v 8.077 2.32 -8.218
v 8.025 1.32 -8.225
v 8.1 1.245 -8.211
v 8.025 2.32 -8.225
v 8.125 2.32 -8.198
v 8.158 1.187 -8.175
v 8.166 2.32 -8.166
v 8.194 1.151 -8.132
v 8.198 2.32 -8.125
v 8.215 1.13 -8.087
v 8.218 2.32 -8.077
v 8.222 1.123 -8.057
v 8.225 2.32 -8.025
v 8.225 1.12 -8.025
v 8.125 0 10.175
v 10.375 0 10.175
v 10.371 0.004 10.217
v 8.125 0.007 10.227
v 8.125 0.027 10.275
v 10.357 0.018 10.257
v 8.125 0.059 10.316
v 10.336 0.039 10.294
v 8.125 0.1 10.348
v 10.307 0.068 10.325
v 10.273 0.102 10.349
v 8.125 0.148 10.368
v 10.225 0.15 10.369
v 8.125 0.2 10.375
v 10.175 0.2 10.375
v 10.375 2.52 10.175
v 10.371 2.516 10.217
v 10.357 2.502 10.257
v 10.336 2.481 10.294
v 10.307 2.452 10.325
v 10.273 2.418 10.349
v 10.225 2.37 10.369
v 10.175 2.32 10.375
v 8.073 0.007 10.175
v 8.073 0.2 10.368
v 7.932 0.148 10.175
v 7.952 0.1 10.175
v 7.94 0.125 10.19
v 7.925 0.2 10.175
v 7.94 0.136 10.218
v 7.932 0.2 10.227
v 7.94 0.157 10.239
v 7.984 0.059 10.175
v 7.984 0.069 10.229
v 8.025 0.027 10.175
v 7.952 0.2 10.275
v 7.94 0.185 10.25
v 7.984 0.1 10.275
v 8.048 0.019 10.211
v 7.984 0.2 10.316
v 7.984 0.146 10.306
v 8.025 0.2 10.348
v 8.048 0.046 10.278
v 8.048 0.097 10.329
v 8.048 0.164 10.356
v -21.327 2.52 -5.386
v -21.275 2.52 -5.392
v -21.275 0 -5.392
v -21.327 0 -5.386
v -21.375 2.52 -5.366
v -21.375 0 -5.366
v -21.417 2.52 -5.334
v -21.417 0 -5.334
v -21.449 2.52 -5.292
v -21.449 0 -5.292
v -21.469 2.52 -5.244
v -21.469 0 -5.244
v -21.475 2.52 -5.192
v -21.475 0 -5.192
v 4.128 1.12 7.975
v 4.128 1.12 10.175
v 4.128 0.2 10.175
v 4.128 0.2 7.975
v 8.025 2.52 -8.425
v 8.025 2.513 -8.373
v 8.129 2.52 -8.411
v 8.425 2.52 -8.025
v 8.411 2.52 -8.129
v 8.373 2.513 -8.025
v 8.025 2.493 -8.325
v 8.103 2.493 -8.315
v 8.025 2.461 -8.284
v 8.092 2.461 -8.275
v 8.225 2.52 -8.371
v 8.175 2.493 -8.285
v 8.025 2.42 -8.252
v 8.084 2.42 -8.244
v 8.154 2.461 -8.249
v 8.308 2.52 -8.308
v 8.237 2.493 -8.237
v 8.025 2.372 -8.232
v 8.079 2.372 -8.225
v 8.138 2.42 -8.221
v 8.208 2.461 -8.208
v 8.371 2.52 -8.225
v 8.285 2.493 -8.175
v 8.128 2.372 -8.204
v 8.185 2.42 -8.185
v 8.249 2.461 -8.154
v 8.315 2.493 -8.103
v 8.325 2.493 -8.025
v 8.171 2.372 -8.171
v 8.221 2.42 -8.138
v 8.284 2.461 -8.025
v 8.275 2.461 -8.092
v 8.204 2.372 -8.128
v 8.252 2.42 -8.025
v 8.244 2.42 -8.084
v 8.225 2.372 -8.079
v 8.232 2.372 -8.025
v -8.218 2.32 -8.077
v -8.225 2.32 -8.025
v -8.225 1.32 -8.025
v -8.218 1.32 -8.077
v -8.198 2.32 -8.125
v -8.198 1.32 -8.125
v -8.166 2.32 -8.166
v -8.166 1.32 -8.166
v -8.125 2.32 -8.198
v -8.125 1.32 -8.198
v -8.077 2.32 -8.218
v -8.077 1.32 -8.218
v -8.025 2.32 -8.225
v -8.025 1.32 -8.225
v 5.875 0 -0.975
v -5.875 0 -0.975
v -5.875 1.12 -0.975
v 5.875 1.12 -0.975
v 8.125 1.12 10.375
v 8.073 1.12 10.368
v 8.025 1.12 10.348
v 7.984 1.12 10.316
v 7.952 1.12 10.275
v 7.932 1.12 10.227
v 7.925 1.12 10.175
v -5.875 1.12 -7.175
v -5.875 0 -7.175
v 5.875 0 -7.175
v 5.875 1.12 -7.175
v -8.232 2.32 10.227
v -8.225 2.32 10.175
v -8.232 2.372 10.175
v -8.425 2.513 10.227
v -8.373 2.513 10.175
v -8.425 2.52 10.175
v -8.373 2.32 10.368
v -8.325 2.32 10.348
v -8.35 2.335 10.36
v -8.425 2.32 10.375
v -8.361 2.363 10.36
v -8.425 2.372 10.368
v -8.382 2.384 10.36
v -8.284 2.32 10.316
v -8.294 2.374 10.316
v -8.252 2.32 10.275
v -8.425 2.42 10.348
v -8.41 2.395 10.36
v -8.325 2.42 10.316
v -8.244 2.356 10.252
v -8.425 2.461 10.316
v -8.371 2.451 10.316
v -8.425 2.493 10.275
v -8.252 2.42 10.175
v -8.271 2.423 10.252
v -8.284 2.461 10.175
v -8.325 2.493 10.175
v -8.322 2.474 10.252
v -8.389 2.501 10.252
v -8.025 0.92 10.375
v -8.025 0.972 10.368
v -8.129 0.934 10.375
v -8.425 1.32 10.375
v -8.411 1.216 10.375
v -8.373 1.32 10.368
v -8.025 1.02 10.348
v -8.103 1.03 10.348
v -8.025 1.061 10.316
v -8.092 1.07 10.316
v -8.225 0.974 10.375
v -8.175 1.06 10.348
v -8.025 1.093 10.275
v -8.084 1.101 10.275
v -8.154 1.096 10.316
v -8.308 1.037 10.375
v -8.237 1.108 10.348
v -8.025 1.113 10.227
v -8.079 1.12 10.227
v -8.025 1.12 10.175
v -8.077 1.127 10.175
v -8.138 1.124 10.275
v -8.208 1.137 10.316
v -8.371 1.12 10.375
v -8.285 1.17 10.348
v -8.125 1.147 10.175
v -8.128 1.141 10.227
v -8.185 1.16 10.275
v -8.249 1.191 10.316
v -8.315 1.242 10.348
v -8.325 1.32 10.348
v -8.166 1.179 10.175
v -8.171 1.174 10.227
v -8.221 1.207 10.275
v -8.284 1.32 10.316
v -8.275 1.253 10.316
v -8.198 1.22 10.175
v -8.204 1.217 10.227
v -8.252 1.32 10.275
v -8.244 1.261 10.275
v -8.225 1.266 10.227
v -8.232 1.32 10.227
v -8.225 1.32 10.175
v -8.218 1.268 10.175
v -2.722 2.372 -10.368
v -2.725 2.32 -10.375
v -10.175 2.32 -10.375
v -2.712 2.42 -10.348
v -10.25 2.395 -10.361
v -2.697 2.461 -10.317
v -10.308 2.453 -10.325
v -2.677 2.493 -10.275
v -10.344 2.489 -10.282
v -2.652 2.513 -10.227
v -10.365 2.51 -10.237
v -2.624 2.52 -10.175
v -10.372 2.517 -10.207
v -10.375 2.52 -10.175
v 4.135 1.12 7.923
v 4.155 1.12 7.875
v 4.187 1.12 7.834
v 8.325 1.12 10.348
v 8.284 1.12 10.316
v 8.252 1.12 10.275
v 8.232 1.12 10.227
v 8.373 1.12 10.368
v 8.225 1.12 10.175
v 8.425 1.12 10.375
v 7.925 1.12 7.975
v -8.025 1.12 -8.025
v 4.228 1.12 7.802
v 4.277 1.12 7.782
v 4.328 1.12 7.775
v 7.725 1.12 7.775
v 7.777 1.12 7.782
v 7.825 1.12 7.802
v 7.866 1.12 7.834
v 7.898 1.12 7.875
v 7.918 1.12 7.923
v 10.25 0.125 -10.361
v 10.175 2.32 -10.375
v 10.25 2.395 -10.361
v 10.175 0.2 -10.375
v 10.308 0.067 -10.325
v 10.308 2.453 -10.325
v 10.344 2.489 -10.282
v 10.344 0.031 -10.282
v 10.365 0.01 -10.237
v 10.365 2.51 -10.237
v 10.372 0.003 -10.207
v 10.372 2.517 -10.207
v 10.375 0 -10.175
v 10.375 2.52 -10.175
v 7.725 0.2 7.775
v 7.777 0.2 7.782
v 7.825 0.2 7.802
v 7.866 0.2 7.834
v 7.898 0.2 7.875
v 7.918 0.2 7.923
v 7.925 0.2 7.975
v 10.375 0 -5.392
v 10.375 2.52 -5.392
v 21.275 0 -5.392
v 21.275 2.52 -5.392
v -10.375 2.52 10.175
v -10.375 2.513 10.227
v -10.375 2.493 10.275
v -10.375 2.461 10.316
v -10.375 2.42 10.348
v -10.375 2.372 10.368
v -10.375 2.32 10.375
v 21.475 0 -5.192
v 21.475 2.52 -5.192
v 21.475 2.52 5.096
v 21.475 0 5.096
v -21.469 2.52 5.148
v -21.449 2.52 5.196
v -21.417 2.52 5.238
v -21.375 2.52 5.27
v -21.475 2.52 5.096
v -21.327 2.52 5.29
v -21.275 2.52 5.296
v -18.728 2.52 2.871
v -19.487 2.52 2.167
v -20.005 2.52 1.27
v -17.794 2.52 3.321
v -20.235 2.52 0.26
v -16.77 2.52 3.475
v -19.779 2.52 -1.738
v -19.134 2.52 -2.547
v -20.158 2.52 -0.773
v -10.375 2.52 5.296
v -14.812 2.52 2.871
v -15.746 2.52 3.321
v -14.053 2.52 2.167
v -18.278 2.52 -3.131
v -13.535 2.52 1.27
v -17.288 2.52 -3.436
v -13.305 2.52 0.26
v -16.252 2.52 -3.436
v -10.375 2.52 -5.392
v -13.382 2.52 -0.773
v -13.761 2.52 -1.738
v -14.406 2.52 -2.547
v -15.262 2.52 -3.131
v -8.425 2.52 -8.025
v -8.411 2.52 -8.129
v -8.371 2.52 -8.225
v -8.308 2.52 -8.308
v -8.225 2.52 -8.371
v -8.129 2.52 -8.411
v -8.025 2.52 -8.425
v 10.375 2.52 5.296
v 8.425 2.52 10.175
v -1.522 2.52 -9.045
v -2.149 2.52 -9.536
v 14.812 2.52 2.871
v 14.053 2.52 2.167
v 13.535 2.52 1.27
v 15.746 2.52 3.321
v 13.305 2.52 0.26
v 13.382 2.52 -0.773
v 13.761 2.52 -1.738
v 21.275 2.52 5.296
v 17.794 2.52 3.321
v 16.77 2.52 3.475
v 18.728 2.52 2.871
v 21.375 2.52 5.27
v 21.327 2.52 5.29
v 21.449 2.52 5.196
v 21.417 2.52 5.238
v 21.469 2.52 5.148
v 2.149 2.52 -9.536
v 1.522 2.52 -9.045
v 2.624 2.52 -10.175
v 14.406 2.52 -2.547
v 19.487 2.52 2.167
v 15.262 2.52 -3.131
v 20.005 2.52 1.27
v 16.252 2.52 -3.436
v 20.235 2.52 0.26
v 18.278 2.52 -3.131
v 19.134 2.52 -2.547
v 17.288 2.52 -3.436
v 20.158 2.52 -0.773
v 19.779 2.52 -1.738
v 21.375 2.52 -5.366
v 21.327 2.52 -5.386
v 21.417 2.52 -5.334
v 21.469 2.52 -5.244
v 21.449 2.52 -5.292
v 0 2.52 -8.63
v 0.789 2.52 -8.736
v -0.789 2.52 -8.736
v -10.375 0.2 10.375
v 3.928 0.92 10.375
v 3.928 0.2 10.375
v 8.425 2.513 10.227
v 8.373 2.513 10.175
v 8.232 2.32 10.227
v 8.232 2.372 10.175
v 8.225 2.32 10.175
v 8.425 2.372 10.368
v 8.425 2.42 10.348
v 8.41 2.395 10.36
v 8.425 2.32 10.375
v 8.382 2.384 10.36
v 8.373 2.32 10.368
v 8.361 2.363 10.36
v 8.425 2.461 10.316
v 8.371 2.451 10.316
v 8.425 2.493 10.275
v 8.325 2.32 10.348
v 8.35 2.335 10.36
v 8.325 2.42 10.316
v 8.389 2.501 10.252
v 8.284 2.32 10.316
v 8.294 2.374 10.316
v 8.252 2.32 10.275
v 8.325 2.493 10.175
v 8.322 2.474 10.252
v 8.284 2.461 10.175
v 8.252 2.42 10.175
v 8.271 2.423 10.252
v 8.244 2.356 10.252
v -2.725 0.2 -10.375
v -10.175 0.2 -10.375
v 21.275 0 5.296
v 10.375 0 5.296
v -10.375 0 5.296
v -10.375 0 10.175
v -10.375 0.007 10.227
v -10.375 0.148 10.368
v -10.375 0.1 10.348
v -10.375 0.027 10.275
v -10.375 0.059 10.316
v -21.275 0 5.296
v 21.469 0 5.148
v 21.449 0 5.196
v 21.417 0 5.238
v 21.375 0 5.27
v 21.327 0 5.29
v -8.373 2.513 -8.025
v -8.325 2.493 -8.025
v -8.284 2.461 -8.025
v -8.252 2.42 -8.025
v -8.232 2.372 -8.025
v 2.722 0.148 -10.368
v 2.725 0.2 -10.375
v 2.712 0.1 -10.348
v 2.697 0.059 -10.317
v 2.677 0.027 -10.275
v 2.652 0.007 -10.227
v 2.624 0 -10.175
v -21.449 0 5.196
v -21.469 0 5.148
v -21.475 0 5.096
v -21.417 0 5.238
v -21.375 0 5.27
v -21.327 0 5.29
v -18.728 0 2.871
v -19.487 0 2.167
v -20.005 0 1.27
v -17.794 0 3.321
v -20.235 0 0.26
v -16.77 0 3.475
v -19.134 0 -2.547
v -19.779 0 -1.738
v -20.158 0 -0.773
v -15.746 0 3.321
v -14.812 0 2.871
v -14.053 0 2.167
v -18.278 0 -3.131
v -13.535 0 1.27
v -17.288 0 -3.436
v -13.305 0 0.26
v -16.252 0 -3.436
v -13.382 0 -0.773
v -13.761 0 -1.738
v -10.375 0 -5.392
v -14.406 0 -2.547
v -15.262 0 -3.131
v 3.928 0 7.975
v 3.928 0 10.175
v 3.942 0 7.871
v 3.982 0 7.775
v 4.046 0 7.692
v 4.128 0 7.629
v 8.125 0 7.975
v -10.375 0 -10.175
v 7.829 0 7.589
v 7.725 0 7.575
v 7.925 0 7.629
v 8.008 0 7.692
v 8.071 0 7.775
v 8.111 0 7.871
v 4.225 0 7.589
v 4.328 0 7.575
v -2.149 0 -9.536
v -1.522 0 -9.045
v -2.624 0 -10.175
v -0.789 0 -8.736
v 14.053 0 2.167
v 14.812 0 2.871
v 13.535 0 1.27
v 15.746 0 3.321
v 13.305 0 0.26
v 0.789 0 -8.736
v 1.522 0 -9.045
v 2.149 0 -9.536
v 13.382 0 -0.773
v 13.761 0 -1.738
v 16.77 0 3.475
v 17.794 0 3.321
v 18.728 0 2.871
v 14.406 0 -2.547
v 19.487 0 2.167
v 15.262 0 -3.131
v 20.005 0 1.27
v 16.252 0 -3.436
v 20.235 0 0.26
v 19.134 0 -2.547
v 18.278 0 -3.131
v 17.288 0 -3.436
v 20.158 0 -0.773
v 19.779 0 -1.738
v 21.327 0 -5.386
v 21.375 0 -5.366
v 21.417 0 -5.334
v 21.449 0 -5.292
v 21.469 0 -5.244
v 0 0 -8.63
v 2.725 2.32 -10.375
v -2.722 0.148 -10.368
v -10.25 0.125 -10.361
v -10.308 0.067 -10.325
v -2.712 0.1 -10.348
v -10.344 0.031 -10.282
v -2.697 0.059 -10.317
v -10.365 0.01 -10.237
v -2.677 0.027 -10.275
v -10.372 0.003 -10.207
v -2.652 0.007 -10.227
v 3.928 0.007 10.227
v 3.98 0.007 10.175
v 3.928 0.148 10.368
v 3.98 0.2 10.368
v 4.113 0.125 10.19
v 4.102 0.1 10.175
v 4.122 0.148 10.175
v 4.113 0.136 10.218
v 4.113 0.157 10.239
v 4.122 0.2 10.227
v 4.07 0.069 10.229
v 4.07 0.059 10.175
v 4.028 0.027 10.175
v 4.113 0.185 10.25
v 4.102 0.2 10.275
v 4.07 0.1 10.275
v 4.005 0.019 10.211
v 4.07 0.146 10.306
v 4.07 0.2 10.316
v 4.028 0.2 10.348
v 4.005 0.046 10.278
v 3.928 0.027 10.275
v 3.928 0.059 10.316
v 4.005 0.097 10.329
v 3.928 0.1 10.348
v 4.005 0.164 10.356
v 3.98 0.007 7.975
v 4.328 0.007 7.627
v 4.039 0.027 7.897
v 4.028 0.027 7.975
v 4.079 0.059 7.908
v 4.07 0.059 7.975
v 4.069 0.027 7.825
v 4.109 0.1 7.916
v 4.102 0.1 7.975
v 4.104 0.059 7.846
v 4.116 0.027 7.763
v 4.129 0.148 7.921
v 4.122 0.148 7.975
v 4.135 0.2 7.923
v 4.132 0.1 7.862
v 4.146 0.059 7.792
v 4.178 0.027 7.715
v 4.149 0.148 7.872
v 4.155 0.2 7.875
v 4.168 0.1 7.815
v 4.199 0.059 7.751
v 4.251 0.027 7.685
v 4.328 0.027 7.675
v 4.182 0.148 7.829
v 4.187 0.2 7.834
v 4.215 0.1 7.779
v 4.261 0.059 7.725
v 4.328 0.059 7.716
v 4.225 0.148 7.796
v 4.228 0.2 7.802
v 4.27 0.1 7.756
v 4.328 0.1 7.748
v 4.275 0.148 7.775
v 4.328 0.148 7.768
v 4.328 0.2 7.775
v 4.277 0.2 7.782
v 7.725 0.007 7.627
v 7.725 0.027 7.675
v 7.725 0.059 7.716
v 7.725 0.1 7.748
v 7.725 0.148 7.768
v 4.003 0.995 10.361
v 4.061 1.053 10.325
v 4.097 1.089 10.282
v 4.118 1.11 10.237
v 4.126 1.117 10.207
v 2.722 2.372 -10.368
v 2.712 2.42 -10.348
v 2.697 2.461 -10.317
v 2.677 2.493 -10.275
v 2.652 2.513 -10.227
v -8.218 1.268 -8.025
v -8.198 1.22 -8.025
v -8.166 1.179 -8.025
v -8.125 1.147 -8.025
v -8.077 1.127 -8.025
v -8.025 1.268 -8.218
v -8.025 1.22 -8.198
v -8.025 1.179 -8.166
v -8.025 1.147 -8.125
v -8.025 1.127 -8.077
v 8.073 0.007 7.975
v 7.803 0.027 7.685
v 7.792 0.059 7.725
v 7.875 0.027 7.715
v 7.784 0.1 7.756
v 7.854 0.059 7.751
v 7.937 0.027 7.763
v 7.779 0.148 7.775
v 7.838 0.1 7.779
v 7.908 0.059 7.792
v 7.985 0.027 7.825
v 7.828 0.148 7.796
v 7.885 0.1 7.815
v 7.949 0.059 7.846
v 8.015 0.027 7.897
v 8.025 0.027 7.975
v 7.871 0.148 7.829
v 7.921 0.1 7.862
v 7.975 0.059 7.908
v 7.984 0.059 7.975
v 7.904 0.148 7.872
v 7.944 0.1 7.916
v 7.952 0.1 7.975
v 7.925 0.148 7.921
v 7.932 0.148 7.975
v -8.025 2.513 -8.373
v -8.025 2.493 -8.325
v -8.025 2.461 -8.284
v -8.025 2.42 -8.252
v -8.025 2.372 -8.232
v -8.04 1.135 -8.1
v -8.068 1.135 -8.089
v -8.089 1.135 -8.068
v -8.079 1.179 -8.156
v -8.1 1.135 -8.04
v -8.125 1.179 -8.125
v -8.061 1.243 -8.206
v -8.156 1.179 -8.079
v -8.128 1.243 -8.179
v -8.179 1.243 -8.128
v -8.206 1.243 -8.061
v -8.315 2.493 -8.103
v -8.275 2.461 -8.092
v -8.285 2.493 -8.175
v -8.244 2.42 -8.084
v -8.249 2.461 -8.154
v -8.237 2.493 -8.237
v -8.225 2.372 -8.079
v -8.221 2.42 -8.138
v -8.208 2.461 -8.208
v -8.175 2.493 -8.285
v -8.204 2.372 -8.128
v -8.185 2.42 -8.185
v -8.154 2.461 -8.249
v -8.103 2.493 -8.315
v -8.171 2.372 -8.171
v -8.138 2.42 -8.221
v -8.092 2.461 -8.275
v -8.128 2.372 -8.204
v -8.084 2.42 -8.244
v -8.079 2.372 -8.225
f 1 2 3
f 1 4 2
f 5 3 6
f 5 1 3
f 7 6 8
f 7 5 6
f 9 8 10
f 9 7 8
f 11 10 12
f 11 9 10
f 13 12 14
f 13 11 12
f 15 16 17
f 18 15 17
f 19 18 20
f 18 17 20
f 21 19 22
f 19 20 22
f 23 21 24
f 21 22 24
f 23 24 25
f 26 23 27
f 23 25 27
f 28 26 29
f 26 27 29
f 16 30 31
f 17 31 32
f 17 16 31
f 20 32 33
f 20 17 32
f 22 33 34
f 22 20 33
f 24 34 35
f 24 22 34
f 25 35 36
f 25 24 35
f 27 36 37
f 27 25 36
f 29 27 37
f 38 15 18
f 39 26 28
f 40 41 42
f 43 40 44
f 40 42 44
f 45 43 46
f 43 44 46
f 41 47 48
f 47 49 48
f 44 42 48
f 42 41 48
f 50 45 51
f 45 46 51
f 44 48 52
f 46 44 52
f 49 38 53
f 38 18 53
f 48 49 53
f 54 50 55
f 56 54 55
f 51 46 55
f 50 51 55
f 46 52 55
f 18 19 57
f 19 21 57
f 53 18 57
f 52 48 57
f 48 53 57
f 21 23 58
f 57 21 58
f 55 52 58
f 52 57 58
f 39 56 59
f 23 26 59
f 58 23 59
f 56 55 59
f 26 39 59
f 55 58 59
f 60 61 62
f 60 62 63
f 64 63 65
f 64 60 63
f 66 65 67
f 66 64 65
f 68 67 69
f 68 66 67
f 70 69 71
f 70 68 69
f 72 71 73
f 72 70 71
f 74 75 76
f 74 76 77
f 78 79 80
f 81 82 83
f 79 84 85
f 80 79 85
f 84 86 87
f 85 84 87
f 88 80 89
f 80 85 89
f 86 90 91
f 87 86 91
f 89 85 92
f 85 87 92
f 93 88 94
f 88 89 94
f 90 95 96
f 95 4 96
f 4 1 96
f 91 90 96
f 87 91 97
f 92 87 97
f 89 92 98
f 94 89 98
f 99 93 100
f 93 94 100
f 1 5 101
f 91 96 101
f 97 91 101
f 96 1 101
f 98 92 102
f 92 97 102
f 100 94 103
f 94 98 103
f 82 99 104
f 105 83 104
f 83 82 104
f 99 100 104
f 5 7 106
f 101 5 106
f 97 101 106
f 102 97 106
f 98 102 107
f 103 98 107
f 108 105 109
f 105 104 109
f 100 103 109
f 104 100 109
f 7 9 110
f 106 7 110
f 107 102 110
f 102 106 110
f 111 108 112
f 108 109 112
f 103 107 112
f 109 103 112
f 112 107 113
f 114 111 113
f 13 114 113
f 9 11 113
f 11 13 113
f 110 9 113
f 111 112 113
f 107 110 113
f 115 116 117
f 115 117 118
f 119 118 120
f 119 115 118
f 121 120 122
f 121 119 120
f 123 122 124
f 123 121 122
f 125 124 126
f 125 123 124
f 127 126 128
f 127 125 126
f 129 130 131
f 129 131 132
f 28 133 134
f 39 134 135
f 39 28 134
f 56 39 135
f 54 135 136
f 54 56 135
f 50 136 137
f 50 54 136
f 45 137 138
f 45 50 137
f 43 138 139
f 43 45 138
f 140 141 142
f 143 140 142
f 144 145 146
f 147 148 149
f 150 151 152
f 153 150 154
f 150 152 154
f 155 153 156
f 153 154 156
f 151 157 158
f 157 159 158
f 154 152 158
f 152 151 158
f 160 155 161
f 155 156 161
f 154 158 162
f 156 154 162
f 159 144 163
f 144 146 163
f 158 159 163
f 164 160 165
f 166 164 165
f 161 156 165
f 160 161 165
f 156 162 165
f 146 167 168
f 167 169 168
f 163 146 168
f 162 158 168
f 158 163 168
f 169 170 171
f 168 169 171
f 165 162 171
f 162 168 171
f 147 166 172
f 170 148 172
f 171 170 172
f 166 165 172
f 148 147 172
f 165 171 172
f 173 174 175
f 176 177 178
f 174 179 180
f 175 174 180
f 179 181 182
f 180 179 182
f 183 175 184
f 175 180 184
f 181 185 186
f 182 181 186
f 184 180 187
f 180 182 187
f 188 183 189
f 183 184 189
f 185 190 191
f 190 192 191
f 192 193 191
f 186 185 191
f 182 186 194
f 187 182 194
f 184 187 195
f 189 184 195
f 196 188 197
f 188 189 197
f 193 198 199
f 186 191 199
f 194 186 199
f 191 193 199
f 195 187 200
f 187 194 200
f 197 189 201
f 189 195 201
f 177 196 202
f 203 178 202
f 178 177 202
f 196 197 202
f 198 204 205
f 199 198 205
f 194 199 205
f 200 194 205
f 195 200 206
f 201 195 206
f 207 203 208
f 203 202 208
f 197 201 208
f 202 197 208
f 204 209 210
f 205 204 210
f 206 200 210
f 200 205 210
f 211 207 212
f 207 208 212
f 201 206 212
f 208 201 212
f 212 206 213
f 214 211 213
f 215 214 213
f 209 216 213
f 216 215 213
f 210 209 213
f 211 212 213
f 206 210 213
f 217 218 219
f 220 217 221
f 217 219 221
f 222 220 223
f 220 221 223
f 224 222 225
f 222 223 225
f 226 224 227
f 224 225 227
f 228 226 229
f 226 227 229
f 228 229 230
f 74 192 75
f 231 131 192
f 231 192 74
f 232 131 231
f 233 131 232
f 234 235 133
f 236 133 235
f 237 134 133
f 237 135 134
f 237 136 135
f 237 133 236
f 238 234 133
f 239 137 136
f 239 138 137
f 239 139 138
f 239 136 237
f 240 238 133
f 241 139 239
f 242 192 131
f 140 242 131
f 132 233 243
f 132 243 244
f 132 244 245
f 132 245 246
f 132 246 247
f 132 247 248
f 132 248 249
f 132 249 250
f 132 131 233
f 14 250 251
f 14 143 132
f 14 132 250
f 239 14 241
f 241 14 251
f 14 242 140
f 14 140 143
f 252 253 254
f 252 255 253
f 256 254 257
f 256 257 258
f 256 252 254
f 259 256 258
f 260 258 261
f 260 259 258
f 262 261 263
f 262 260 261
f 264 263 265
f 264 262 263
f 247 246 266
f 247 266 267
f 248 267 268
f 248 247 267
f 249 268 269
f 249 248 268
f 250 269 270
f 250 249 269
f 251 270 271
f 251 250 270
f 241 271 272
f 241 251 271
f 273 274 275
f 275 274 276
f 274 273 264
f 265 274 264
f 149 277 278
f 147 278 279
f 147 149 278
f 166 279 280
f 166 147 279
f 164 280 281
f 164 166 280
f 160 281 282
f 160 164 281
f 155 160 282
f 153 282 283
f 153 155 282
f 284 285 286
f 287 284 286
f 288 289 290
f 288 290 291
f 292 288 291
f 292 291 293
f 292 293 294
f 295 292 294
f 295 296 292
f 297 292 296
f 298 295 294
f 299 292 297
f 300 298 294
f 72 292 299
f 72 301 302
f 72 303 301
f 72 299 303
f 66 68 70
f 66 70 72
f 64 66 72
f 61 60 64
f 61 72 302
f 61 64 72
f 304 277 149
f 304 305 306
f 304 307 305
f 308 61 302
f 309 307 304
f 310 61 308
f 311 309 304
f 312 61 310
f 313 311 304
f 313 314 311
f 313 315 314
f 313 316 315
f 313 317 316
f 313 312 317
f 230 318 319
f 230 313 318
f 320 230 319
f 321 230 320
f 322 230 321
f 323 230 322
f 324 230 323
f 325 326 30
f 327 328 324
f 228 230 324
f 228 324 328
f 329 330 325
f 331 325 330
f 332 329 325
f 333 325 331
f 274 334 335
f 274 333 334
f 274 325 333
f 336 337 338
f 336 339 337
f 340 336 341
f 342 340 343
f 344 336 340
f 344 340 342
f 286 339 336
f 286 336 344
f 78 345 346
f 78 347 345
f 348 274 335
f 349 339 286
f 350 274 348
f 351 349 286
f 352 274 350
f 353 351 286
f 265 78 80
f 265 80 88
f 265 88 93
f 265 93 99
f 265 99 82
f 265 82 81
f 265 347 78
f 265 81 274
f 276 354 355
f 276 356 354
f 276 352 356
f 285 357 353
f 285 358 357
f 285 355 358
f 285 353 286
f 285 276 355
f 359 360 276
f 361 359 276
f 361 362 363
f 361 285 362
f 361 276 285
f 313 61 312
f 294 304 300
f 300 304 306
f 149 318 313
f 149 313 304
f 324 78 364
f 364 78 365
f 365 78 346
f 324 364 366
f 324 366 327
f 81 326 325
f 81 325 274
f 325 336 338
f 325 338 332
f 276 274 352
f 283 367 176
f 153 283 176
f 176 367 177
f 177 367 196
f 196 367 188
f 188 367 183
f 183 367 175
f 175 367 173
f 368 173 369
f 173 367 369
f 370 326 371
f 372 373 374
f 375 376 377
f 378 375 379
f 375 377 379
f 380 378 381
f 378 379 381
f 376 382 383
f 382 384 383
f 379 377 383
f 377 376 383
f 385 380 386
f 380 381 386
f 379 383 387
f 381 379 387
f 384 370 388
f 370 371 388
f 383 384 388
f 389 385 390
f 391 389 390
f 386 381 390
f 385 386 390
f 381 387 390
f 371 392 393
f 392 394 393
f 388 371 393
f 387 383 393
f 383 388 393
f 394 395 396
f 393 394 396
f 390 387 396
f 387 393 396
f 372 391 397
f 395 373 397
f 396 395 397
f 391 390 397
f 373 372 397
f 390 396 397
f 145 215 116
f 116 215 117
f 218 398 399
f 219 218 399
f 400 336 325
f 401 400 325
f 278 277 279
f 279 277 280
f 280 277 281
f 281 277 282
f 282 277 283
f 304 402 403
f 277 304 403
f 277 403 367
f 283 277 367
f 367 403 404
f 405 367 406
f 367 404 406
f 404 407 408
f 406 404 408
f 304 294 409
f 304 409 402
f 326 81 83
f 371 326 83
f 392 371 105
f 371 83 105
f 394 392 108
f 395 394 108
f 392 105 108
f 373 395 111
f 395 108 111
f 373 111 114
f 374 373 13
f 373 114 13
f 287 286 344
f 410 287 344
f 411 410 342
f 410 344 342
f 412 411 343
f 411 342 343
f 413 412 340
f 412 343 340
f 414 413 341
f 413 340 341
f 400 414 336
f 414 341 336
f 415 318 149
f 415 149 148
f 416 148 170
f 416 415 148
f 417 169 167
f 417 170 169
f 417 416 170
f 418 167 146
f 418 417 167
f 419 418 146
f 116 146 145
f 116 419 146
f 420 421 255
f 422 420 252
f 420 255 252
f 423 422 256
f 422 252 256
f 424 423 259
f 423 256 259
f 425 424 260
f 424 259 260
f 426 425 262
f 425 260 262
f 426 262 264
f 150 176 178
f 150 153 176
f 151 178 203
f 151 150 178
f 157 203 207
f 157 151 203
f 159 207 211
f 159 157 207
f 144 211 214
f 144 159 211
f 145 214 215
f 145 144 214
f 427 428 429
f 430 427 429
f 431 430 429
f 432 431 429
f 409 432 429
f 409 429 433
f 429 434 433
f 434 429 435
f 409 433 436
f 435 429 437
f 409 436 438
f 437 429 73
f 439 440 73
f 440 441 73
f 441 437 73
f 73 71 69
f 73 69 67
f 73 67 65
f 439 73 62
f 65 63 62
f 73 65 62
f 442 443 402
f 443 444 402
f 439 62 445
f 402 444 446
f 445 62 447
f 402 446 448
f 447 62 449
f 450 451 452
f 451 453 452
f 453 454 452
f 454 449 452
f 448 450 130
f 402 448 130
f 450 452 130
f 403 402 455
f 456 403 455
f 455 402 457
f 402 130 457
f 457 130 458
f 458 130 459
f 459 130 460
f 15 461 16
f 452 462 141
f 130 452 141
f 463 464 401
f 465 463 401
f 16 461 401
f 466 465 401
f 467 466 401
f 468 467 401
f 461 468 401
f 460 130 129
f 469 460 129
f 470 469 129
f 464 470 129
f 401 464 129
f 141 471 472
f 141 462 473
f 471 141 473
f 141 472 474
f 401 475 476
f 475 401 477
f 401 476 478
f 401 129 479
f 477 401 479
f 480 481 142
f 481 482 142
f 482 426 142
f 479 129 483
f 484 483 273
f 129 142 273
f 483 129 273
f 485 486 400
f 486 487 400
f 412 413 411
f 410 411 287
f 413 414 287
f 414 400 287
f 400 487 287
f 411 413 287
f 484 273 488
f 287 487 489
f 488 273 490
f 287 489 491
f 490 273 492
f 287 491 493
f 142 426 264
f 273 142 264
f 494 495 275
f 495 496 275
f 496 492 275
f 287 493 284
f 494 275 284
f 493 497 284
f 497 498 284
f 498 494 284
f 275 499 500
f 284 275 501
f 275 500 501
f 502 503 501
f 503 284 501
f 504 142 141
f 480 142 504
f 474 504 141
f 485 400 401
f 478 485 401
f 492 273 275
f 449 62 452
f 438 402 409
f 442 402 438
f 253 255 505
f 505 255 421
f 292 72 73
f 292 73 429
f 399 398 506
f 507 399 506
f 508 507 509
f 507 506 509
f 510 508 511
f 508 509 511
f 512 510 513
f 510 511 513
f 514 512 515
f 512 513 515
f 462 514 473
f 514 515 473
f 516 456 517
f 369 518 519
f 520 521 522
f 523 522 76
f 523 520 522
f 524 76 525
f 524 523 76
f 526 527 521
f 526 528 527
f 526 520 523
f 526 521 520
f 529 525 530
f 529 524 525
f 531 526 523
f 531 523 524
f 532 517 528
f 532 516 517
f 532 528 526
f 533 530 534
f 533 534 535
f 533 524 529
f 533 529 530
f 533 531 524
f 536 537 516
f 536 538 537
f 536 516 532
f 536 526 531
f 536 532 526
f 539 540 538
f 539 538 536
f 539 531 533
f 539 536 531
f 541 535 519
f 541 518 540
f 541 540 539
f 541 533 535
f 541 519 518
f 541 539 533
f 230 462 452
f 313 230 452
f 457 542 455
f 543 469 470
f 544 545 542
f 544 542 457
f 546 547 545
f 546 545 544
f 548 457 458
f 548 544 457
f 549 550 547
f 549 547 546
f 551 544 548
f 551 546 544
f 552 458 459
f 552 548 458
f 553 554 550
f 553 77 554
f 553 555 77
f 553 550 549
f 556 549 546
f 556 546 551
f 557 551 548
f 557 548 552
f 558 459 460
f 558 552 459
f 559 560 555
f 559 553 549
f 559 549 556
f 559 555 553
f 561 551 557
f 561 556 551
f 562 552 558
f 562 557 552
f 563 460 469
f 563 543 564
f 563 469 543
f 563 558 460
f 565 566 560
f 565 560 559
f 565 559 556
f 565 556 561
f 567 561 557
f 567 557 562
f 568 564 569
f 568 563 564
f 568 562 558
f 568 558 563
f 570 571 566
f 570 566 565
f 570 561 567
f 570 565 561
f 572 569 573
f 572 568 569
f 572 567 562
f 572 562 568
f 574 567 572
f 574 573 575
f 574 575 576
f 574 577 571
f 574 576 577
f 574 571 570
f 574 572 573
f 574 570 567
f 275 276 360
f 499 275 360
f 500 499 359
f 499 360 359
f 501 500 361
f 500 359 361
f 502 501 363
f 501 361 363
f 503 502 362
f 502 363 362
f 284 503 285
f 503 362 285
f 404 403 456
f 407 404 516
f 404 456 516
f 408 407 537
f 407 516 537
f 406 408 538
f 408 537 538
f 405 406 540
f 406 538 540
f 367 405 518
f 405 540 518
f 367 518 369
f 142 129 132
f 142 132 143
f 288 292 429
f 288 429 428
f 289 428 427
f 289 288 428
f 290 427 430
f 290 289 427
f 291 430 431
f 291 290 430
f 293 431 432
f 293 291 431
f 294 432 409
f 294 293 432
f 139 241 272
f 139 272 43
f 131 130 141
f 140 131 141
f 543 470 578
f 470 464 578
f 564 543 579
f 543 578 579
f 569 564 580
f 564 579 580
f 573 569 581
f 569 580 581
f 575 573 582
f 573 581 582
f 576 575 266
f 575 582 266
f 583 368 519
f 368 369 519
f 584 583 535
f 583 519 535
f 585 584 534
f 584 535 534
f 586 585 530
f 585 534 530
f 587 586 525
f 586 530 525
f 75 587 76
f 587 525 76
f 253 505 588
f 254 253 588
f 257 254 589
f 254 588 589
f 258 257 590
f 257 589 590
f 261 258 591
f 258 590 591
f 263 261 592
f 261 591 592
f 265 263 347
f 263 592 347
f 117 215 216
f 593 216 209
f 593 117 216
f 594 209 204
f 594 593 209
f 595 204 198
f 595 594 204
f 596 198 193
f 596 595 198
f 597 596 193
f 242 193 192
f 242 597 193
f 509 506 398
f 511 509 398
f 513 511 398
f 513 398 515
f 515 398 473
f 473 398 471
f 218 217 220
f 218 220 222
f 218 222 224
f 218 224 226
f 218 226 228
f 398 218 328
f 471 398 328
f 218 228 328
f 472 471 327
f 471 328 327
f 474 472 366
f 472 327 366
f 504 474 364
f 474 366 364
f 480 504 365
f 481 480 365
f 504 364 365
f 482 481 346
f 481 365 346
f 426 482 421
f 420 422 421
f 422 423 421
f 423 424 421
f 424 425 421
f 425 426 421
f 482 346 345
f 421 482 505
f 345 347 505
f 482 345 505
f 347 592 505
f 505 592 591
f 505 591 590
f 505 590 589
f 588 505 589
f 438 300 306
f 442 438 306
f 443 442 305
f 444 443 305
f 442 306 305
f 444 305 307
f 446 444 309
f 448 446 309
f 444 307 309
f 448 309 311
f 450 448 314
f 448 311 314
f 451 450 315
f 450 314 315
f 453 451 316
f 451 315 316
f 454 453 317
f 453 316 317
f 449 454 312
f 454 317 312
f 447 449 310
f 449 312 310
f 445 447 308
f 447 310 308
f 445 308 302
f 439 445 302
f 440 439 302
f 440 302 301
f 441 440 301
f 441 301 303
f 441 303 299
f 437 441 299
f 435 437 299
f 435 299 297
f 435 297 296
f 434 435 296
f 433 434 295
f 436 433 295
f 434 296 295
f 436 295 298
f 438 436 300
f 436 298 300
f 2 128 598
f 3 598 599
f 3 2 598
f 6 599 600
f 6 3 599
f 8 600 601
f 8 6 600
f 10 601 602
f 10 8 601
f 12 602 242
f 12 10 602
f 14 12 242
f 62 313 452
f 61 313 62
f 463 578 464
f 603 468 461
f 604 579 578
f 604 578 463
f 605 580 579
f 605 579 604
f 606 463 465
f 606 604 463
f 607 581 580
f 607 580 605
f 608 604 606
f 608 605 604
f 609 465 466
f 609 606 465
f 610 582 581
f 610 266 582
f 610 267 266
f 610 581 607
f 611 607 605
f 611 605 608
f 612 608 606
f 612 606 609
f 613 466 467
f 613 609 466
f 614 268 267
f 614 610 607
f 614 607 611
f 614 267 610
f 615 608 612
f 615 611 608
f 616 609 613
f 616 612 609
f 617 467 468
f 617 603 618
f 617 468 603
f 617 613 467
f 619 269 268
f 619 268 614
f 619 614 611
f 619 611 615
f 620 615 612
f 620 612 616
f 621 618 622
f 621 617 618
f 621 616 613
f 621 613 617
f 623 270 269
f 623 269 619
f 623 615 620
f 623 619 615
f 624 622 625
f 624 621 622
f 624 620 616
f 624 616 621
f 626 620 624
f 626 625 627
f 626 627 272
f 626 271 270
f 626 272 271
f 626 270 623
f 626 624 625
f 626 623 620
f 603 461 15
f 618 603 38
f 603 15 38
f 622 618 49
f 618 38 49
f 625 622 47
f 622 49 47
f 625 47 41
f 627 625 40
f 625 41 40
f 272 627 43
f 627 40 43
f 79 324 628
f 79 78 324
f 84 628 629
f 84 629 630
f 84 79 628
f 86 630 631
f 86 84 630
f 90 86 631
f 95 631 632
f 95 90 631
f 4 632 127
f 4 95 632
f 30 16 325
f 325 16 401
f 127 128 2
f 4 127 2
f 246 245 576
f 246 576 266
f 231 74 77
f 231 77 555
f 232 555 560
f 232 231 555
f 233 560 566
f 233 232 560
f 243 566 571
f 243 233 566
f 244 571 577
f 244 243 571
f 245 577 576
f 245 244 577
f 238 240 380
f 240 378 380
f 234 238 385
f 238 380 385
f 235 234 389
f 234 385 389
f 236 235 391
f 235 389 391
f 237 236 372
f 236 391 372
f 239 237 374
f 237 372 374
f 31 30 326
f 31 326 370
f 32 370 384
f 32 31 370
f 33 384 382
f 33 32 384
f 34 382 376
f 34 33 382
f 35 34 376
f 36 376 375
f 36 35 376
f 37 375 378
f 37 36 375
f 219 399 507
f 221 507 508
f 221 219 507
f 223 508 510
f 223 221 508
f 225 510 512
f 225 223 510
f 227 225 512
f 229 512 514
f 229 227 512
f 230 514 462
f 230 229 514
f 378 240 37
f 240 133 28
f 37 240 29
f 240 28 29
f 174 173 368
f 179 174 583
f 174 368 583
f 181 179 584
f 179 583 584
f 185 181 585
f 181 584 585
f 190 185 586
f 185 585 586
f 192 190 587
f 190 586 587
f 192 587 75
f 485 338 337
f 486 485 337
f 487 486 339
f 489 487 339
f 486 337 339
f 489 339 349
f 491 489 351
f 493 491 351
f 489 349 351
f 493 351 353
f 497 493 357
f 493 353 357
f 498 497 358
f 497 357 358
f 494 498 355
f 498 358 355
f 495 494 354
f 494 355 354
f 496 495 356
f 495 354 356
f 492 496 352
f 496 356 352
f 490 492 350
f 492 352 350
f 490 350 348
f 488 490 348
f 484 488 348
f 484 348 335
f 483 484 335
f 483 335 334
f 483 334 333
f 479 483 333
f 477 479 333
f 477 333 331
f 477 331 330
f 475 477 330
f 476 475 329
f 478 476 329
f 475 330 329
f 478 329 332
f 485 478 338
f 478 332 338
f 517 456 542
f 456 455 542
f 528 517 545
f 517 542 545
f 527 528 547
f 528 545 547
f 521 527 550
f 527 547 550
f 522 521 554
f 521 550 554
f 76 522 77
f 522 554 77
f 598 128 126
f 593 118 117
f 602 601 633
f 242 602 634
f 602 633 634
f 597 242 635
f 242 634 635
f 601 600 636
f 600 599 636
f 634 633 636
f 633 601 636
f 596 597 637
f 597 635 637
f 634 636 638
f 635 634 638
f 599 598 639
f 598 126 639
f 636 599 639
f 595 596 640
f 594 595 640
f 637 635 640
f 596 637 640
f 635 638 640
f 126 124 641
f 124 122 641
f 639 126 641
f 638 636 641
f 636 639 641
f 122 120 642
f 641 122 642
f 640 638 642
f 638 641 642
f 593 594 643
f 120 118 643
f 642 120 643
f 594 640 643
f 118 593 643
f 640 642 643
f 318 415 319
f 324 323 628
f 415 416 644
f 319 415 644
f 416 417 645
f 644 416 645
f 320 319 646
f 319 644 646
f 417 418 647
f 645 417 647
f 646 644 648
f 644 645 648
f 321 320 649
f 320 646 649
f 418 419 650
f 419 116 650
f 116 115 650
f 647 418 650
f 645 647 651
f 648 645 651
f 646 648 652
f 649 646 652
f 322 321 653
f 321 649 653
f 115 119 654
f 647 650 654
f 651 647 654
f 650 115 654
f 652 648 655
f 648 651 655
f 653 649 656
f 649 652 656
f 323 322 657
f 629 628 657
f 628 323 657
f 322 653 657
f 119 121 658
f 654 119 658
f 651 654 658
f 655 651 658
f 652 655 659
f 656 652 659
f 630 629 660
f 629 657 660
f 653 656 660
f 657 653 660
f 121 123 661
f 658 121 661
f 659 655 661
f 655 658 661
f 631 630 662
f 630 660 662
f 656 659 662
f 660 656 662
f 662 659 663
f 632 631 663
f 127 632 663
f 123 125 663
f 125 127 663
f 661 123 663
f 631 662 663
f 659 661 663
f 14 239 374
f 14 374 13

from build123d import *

# Parameters (mm, degrees)
SKETCH1_W           = 20.75
SKETCH1_H           = 20.75
SKETCH1_W_2         = 11.75
SKETCH1_H_2         = 6.2
BOSS_EXTRUDE1_DEPTH = 1.12
SKETCH2_W           = 2.15
SKETCH2_H           = 18.6
BOSS_EXTRUDE2_DEPTH = 1.4
CUT_EXTRUDE1_DEPTH  = 15.739106147
FILLET1_R           = 0.2
SKETCH5_R           = 3.475
BOSS_EXTRUDE3_DEPTH = 2.52
SKETCH6_R           = 3
CUT_EXTRUDE2_DEPTH  = 10


with BuildPart() as part:
    # Sketch1 → Boss-Extrude1 (new body)
    with BuildSketch(Plane(origin=(0, 0, 0), x_dir=(1, 0, 0), z_dir=(0, 1, 0))):
        Rectangle(SKETCH1_W, SKETCH1_H)
        with Locations((0, 4.075)):
            Rectangle(SKETCH1_W_2, SKETCH1_H_2, mode=Mode.SUBTRACT)
    extrude(amount=BOSS_EXTRUDE1_DEPTH)

    # Sketch2 → Boss-Extrude2 (add)
    with BuildSketch(Plane(origin=(0, 1.12, 0), x_dir=(1, 0, 0), z_dir=(0, 1, 0))):
        Polygon((10.375, 10.375), (-10.375, 10.375), (-10.375, 8.225), (-8.225, 8.225), (8.225, 8.225), (10.375, 8.225), align=None)
        with Locations((-9.3, -1.075)):
            Rectangle(SKETCH2_W, SKETCH2_H)
        with Locations((9.3, -1.075)):
            Rectangle(SKETCH2_W, SKETCH2_H)
    extrude(amount=BOSS_EXTRUDE2_DEPTH)

    # Sketch3 → Cut-Extrude1 (cut, through all)
    with BuildSketch(Plane(origin=(0, 1.12, 0), x_dir=(1, 0, 0), z_dir=(0, 1, 0))):
        with BuildLine():
            Line((7.925, -10.375), (4.128372784, -10.375))
            Line((4.128372784, -10.375), (4.128372784, -7.975))
            ThreePointArc((4.128372784, -7.975), (4.186951428, -7.833578644), (4.328372784, -7.775))
            Line((4.328372784, -7.775), (7.725, -7.775))
            ThreePointArc((7.725, -7.775), (7.866421356, -7.833578644), (7.925, -7.975))
            Line((7.925, -7.975), (7.925, -10.375))
        make_face()
    extrude(amount=-CUT_EXTRUDE1_DEPTH, mode=Mode.SUBTRACT)

    # Fillet1
    fillet1_edges = [part.edges().sort_by_distance(p)[0] for p in [
        (-2.048313608, 1.12, 10.375),
        (-8.225, 1.82, -8.225),
        (0, 1.12, -8.225),
        (-8.225, 2.52, 1.075),
        (-8.225, 1.82, 10.375),
        (-9.3, 2.52, 10.375),
        (0, 2.52, -8.225),
        (8.225, 2.52, 1.075),
        (0, 2.52, -10.375),
        (-8.225, 1.12, 1.075),
        (8.225, 1.82, -8.225),
        (9.3, 2.52, 10.375),
        (8.225, 1.82, 10.375),
        (-3.123313608, 0, 10.375),
        (0, 0, -10.375),
        (9.15, 0, 10.375),
        (7.925, 0, 9.175),
        (7.925, 0.56, 10.375),
        (4.128372784, 0, 9.175),
        (4.128372784, 0.56, 10.375),
        (4.186951428, 0, 7.833578644),
        (6.026686392, 0, 7.775),
        (7.866421356, 0, 7.833578644),
        (10.375, 1.26, 10.375),
        (-10.375, 1.26, -10.375),
        (10.375, 1.26, -10.375),
    ]]
    fillet(fillet1_edges, radius=FILLET1_R)

    # Sketch5 → Boss-Extrude3 (add)
    # profile 1 of 2: a face of its own
    with BuildSketch(Plane(origin=(0, 2.52, 0), x_dir=(1, 0, 0), z_dir=(0, 1, 0))):
        with BuildLine():
            Line((-10.375, 5.392486931), (-21.275499471, 5.392486931))
            ThreePointArc((-21.275499471, 5.392486931), (-21.416920828, 5.333908287), (-21.475499471, 5.192486931))
            Line((-21.475499471, 5.192486931), (-21.475499471, -5.096478262))
            ThreePointArc((-21.475499471, -5.096478262), (-21.416920828, -5.237899618), (-21.275499471, -5.296478262))
            Line((-21.275499471, -5.296478262), (-10.375, -5.296478262))
            Line((-10.375, -5.296478262), (-10.375, 5.392486931))
        make_face()
        with Locations(Location((-16.77, 0, 0), (0, 0, 270))):
            Circle(SKETCH5_R, mode=Mode.SUBTRACT)
    # profile 2 of 2: a face of its own
    with BuildSketch(Plane(origin=(0, 2.52, 0), x_dir=(1, 0, 0), z_dir=(0, 1, 0))):
        with BuildLine():
            Line((10.375, 5.392486931), (21.275499471, 5.392486931))
            ThreePointArc((21.275499471, 5.392486931), (21.416920828, 5.333908287), (21.475499471, 5.192486931))
            Line((21.475499471, 5.192486931), (21.475499471, -5.096478262))
            ThreePointArc((21.475499471, -5.096478262), (21.416920828, -5.237899618), (21.275499471, -5.296478262))
            Line((21.275499471, -5.296478262), (10.375, -5.296478262))
            Line((10.375, -5.296478262), (10.375, 5.392486931))
        make_face()
        with Locations(Location((16.77, 0, 0), (0, 0, 270))):
            Circle(SKETCH5_R, mode=Mode.SUBTRACT)
    extrude(amount=-BOSS_EXTRUDE3_DEPTH)

    # Sketch6 → Cut-Extrude2 (cut)
    with BuildSketch(Plane(origin=(0, 2.52, 0), x_dir=(1, 0, 0), z_dir=(0, 1, 0))):
        with Locations((0, 11.63)):
            Circle(SKETCH6_R)
    extrude(amount=-CUT_EXTRUDE2_DEPTH, mode=Mode.SUBTRACT)


solid = part.part
